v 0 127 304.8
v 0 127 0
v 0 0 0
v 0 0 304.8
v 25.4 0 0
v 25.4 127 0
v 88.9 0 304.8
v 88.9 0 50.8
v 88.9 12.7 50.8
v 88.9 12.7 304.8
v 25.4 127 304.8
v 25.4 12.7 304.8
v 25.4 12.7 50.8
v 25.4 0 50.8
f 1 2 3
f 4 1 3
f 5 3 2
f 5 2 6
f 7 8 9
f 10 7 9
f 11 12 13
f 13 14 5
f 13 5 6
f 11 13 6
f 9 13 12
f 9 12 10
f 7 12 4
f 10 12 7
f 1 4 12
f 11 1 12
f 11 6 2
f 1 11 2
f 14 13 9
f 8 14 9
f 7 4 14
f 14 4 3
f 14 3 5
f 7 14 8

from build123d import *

# Parameters (mm, degrees)
F1_DEPTH = 304.8
F2_START = 50.8
F0_W     = 63.5
F0_H     = 12.7
F2_DEPTH = 254


with BuildPart() as f1:
    # F0 (on Top) → F1 (new body)
    with BuildSketch(Plane.XY):
        Polygon((0, 127), (0, 0), (25.4, 0), (25.4, 12.7), (25.4, 127), align=None)
    extrude(amount=F1_DEPTH)

    # F0 (on Top) → F2 (join)
    with BuildSketch(Plane.XY.offset(F2_START)):
        with Locations((57.15, 6.35)):
            Rectangle(F0_W, F0_H)
    extrude(amount=F2_DEPTH)


solid = f1.part
